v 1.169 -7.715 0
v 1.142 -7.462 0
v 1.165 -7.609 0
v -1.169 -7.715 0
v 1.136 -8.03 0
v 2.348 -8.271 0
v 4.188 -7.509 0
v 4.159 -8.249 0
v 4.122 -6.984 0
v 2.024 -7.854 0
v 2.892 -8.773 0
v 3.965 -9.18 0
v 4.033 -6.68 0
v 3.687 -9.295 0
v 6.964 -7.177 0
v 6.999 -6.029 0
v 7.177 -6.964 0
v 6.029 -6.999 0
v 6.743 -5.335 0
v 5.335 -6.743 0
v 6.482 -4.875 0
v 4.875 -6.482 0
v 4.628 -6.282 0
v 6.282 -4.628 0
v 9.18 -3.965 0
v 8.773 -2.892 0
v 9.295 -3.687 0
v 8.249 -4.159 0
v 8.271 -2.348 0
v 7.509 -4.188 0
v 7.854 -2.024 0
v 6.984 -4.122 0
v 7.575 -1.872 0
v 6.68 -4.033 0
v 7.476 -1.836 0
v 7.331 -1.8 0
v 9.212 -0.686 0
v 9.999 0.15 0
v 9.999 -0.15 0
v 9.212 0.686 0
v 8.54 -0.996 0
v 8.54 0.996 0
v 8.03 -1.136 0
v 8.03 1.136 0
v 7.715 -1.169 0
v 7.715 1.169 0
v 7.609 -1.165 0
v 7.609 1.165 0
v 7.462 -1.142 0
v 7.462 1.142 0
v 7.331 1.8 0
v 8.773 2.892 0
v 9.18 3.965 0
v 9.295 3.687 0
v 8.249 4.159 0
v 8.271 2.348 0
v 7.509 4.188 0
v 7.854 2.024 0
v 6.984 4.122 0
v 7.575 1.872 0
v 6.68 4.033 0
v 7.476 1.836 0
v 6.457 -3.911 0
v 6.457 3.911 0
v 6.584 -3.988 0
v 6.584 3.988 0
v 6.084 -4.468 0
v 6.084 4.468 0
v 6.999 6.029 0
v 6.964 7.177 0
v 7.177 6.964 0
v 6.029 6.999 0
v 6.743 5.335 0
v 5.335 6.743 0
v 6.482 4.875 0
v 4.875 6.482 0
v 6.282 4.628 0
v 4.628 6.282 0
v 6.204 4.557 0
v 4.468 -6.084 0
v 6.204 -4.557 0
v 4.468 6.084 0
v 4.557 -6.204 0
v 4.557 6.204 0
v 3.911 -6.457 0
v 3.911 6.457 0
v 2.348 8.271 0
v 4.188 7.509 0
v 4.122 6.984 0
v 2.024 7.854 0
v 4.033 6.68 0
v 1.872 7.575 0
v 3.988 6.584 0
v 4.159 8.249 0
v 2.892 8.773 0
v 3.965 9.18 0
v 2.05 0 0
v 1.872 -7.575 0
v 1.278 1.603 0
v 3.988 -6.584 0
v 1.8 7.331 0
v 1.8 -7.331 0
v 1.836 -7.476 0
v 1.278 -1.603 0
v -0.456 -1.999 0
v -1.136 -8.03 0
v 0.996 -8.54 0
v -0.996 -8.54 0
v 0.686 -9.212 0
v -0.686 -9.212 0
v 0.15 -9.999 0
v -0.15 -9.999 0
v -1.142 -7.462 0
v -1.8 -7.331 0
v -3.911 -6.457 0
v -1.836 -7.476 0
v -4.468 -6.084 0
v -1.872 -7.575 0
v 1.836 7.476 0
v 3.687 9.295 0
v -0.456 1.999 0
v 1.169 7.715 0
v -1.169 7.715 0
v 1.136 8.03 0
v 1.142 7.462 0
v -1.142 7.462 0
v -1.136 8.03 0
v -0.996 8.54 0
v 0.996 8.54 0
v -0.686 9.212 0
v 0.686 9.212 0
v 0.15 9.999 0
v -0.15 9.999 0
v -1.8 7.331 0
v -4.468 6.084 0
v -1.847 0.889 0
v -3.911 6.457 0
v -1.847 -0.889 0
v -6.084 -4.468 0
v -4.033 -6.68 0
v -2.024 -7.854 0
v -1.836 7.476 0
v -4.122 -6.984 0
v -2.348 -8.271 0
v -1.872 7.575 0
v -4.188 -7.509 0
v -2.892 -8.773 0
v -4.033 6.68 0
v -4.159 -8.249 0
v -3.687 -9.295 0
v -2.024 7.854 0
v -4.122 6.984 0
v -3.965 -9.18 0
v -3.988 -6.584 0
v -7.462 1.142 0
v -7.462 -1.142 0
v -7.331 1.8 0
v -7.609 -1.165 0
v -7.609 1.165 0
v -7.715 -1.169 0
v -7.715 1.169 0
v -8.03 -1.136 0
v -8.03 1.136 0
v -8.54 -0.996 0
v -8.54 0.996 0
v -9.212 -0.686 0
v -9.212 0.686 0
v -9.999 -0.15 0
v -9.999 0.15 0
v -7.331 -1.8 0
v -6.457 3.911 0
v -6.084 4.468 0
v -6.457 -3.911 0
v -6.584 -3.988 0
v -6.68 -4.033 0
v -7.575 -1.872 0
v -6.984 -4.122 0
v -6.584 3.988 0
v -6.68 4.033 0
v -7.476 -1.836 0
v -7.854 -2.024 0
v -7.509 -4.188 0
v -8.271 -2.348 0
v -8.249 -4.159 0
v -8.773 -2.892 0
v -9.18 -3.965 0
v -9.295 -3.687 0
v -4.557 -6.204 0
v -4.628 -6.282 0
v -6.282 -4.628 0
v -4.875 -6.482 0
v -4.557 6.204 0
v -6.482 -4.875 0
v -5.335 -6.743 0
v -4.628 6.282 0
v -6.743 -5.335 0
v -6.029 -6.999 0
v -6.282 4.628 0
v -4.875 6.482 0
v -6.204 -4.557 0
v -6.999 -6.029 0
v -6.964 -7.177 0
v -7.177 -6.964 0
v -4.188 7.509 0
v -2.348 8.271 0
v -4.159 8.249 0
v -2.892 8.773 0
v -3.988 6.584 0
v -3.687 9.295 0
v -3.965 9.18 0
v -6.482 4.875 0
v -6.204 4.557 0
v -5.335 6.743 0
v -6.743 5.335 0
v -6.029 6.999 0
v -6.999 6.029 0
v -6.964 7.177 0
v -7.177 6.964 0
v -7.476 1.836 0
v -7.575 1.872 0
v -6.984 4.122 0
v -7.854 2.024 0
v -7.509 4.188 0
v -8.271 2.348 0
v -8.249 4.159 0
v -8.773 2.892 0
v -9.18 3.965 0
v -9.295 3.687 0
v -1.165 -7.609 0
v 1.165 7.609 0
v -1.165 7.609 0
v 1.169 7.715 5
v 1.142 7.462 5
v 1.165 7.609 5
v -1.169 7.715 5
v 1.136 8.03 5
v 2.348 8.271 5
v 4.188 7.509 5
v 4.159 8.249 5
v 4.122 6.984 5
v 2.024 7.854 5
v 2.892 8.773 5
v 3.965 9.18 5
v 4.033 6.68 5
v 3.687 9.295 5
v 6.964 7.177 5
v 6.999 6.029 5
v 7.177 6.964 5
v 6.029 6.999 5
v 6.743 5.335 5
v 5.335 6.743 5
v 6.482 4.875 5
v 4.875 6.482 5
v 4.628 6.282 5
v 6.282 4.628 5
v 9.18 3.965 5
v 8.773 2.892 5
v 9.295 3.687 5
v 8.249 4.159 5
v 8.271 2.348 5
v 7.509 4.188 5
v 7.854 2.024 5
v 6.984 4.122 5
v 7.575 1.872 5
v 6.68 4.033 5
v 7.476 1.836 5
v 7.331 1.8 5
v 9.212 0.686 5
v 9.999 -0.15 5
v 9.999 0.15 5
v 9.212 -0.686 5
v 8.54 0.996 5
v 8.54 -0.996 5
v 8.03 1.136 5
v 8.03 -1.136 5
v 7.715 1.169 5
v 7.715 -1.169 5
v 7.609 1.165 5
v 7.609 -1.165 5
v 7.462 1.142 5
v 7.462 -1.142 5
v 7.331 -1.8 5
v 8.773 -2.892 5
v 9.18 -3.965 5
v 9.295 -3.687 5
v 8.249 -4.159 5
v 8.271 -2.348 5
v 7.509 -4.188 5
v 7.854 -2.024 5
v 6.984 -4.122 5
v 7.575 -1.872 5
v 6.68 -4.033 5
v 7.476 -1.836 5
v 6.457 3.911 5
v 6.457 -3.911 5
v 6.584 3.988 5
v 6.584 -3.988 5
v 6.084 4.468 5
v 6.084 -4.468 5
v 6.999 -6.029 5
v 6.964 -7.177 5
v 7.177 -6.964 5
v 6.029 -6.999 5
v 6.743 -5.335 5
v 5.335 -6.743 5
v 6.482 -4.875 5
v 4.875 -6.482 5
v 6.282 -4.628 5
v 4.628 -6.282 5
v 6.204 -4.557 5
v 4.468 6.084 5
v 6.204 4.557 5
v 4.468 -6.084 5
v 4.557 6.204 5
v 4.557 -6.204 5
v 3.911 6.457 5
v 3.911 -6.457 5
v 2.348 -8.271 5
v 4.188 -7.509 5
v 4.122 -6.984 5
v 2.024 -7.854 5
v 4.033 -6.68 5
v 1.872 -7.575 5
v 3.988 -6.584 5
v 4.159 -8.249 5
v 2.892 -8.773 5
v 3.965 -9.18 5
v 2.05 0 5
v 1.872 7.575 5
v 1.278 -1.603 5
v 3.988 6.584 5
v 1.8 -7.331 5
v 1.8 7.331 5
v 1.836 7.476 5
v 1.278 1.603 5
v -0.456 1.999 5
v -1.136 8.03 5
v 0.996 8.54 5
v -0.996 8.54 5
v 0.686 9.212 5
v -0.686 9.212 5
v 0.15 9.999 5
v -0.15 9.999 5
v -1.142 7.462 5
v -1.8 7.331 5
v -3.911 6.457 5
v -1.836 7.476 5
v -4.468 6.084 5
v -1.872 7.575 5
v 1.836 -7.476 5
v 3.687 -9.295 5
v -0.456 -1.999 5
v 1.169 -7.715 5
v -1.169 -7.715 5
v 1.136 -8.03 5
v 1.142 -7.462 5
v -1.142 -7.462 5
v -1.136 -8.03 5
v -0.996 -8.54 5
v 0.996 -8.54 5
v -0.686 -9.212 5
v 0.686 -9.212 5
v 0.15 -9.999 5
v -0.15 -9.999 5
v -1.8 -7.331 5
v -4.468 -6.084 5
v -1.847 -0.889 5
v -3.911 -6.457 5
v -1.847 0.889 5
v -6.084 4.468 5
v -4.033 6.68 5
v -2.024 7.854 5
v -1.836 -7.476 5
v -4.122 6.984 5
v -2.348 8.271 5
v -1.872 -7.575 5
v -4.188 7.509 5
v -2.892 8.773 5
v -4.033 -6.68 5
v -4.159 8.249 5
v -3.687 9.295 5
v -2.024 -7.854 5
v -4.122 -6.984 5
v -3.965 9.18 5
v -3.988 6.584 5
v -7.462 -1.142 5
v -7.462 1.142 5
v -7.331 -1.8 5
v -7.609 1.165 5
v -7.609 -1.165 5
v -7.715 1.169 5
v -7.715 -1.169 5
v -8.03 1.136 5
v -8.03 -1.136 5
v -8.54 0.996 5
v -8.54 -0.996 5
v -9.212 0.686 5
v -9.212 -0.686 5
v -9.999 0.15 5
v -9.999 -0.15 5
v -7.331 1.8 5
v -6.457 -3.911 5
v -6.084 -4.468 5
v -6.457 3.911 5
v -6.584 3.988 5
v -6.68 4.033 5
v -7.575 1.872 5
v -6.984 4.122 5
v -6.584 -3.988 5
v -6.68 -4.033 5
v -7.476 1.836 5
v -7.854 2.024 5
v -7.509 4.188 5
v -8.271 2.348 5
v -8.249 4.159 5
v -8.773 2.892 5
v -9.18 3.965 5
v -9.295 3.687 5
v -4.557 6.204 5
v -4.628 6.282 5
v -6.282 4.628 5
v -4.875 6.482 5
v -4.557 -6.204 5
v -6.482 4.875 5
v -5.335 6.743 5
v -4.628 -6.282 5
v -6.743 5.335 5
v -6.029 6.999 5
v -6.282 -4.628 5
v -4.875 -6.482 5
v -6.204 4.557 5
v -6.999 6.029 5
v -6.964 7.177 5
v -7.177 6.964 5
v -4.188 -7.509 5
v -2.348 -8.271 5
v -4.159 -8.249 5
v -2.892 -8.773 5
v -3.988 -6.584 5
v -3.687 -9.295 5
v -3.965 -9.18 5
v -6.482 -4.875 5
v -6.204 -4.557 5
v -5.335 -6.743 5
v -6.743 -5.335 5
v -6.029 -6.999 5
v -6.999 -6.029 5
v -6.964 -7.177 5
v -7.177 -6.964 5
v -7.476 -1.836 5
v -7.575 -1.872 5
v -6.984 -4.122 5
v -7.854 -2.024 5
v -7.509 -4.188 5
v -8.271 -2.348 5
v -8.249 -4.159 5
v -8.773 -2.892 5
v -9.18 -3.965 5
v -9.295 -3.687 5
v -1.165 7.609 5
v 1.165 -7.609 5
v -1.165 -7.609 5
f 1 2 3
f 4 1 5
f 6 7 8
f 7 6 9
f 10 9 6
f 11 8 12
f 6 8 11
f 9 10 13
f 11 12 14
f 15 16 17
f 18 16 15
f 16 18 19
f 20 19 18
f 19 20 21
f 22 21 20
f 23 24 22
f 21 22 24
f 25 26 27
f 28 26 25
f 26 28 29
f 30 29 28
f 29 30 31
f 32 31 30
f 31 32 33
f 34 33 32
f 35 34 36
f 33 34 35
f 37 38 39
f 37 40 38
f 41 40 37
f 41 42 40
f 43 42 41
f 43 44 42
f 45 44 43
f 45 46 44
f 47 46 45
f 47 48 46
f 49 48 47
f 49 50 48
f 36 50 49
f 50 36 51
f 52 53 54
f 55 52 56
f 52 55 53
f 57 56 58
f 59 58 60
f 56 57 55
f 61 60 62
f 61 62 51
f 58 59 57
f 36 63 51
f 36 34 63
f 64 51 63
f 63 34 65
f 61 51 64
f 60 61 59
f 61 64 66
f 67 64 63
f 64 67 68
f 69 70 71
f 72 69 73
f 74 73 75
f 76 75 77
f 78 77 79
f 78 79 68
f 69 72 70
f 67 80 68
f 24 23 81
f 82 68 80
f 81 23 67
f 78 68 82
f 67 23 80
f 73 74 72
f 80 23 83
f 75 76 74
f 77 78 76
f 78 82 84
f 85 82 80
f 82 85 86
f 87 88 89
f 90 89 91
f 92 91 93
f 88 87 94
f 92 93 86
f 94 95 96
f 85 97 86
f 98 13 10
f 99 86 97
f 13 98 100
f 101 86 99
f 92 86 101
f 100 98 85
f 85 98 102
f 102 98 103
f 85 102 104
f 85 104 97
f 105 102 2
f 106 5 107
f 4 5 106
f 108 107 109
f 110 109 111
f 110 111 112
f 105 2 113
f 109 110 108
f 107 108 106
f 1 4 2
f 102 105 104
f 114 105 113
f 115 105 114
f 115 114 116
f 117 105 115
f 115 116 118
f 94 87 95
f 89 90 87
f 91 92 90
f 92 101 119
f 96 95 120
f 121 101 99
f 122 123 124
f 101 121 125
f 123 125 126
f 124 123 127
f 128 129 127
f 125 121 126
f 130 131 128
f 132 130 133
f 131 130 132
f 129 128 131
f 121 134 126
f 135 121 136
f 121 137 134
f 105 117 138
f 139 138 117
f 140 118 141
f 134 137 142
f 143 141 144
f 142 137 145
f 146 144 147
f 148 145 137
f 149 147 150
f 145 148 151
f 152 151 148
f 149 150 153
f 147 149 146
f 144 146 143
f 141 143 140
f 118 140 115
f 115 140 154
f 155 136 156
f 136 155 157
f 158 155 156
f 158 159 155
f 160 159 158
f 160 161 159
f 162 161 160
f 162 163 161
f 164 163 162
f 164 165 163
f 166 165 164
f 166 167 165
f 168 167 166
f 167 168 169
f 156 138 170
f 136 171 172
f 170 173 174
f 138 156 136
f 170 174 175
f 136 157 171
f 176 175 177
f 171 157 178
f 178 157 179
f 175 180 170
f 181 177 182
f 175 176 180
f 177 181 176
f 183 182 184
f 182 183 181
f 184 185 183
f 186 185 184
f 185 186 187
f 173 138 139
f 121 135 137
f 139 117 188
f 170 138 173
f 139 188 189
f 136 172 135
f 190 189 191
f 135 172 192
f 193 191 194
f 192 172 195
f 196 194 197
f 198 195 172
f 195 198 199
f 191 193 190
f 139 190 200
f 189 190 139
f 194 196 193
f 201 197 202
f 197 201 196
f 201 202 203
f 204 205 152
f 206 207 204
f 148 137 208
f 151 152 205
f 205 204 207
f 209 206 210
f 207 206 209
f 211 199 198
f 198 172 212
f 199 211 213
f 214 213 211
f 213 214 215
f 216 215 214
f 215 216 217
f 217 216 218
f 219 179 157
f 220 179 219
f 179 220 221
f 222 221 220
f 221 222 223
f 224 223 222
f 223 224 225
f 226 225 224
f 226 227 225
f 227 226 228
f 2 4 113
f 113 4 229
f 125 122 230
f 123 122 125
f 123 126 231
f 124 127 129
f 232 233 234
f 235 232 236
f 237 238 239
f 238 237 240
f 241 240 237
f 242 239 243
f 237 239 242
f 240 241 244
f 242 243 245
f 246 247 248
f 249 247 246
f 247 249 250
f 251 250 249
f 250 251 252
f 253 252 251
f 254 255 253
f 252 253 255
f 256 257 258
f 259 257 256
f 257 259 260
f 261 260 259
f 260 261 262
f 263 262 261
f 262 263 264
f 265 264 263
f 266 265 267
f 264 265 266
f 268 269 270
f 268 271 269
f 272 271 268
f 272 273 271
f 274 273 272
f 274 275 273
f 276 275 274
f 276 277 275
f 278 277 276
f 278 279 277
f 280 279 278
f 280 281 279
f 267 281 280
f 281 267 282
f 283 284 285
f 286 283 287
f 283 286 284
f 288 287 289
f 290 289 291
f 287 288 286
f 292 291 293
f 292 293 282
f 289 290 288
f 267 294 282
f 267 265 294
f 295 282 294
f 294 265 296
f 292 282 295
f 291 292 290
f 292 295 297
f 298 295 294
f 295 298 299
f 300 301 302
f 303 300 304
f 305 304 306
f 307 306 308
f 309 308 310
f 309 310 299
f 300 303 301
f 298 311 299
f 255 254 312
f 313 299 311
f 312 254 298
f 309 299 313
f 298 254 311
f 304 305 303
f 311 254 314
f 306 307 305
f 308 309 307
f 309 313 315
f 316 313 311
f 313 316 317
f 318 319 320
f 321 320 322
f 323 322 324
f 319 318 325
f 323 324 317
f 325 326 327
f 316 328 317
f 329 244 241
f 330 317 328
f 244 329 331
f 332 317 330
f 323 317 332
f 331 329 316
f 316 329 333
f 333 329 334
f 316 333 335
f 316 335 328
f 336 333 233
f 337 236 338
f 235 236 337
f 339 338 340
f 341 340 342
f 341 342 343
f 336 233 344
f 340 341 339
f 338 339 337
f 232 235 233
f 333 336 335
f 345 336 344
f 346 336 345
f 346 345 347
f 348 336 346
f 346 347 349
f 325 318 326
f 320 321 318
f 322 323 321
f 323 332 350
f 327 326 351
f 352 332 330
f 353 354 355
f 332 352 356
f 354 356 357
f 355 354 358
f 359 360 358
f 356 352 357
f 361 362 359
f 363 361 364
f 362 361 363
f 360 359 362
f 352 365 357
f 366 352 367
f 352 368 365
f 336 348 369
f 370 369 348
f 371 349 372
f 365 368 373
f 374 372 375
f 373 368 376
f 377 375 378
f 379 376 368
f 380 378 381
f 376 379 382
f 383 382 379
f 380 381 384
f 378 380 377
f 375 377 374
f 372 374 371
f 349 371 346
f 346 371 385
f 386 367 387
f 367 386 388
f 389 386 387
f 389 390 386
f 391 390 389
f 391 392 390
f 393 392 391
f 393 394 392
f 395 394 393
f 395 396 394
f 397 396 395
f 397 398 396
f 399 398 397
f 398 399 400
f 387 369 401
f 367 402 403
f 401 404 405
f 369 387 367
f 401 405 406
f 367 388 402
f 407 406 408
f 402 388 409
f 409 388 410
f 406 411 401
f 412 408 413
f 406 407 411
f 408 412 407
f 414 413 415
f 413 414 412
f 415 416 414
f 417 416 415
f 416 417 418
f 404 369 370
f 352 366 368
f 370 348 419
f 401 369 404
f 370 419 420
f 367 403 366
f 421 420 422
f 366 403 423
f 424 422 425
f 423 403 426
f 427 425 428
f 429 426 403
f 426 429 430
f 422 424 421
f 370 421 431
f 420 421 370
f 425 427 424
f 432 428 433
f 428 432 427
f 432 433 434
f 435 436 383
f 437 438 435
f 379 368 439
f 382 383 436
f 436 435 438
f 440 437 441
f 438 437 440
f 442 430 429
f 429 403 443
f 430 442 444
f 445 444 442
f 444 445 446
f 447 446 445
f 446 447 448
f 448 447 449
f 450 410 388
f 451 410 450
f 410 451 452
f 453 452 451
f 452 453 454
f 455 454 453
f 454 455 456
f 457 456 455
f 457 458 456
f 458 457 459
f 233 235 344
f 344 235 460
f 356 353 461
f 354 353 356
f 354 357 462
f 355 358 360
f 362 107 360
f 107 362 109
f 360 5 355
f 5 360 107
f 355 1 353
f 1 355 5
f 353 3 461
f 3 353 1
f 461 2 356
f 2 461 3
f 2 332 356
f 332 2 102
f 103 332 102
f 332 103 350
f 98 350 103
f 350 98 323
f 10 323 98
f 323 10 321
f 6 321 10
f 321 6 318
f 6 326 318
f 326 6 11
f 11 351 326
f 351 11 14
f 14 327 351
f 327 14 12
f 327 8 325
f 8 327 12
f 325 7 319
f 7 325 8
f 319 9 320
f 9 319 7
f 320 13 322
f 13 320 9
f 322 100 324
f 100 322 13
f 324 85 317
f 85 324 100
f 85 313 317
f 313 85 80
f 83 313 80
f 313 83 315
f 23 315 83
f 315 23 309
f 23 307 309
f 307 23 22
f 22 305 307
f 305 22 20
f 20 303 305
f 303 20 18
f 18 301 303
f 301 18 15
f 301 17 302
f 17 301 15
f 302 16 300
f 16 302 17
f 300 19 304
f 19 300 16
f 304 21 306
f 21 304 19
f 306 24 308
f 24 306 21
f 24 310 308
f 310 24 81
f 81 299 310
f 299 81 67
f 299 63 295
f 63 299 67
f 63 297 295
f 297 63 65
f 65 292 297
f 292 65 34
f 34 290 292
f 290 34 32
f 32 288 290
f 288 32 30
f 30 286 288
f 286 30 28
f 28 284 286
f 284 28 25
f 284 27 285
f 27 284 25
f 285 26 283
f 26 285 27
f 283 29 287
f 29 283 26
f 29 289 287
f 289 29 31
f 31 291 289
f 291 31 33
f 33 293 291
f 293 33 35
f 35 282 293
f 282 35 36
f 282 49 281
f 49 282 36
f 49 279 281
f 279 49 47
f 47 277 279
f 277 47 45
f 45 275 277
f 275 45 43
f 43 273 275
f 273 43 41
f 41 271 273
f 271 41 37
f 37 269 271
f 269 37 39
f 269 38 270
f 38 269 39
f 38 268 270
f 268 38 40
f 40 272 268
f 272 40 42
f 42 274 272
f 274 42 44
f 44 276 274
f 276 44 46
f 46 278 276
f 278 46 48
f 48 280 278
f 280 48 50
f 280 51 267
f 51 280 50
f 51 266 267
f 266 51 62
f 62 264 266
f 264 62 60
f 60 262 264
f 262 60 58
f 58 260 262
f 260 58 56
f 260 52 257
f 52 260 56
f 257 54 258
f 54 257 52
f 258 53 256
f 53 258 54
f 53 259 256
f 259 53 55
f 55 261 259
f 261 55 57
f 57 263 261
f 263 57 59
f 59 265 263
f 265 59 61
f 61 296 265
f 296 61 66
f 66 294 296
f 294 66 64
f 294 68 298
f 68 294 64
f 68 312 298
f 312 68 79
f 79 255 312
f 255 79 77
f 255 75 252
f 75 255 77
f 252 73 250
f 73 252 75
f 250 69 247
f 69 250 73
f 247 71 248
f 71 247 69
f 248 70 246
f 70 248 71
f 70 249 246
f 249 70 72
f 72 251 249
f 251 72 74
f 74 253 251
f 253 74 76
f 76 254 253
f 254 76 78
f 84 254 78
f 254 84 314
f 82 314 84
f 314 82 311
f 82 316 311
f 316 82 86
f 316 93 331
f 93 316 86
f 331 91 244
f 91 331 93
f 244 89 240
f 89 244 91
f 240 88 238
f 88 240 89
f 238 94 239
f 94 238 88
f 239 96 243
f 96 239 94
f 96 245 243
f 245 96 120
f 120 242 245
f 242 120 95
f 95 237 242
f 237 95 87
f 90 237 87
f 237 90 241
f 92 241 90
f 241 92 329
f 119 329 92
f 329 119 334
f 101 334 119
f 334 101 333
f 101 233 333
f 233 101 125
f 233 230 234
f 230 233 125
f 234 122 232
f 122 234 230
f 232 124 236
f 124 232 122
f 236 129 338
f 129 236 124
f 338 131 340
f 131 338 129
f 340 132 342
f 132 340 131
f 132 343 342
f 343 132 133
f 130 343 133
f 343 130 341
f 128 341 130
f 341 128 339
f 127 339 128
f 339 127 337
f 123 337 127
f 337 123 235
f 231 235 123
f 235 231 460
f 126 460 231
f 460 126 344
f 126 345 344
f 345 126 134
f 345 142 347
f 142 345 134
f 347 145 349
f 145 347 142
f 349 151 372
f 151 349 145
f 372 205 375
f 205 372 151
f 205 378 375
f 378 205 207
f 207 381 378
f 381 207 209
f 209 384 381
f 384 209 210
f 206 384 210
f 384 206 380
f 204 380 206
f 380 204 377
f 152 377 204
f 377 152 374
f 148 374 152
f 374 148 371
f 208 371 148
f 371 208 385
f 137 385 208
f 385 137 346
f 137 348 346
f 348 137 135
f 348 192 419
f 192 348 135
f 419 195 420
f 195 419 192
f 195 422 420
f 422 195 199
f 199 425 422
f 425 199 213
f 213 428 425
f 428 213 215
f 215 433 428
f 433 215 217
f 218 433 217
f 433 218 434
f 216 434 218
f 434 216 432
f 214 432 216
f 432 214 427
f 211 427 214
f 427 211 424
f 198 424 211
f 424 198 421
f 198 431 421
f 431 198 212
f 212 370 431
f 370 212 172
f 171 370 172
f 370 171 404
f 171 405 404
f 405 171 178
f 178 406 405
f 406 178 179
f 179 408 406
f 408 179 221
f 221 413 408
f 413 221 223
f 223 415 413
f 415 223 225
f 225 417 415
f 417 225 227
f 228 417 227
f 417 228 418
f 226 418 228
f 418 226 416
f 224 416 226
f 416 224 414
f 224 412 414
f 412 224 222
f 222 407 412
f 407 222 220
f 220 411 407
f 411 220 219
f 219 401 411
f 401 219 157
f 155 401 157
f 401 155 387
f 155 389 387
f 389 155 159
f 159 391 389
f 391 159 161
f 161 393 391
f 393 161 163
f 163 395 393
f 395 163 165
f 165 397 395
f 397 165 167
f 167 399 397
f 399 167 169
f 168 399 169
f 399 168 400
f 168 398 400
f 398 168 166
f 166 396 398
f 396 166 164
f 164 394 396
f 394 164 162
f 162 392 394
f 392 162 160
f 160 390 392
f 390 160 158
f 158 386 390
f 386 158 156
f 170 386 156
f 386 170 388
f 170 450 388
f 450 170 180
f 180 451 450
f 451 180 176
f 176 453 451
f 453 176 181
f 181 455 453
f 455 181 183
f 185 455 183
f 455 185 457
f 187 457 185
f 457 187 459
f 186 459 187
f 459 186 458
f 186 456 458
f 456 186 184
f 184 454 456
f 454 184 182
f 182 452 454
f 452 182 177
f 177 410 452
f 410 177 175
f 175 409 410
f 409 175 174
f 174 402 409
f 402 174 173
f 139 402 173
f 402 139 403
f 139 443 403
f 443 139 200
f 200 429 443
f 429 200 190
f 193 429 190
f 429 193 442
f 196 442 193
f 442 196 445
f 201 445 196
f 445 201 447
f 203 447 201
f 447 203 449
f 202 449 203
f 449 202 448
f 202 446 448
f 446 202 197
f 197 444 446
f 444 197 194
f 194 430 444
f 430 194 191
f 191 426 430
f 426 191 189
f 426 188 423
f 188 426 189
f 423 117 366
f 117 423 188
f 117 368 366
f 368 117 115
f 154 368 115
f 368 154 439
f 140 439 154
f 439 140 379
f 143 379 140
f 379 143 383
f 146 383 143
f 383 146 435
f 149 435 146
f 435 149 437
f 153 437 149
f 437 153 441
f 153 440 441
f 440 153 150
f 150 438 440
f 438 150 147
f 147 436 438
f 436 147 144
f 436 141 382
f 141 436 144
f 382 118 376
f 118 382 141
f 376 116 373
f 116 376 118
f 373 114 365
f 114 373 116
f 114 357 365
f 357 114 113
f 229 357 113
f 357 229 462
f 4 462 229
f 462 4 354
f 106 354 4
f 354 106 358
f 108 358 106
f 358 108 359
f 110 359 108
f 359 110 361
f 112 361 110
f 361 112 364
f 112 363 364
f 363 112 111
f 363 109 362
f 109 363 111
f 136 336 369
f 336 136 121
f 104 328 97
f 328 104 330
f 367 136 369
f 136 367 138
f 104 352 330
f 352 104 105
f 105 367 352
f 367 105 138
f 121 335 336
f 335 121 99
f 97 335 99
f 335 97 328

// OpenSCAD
use <../libraries/MCAD/involute_gears.scad>

//test_gears();
Gear();

module SmoothHole() {
    translate([6.5,0,-1]) cylinder(r=1.5, h=10, $fn=6);
}

module WadeL_double_helix(){
	//Large WADE's Gear - Double Helix

	pressure_angle=30;
    hub_diameter = 0;
    rim_width = 0;
	circles=0;
	teeth=30;
	pitch=200;
	twist=250;
	height=40;
    bore_diameter = 4;

	difference(){
		union(){
		// половина шевронной шестерни
		gear (number_of_teeth=teeth,
			circular_pitch=pitch,
			pressure_angle=pressure_angle,
			clearance = 0.2,
			gear_thickness = height/2,
			rim_thickness = height/2,
			rim_width = rim_width,
			hub_thickness = height/2*1.5-2-1.5,
			hub_diameter = hub_diameter,
			bore_diameter = bore_diameter,
			circles=circles,
			twist = twist/teeth);
		// вторая половина шевронной шестерни
		mirror([0,0,50])
		gear (number_of_teeth=teeth,
			circular_pitch=pitch,
			pressure_angle=pressure_angle,
			clearance = 0.2,
			gear_thickness = height/2,
			rim_thickness = height/2,
			rim_width = rim_width,
			hub_thickness = height/2,
			hub_diameter=hub_diameter,
			bore_diameter=bore_diameter,
            circles=circles,
			twist=twist/teeth);
		}
	}
}

module Gear(){
	//Large WADE's Gear - Double Helix

	pressure_angle=30;
    hub_diameter = 0;
    rim_width = 0;
	circles=0;
	teeth=16;
	pitch=200;
	twist=0;
	height=5;
    bore_diameter = 4.1;

    gear (number_of_teeth=teeth,
        circular_pitch=pitch,
        pressure_angle=pressure_angle,
        clearance = 0.2,
        gear_thickness = height,
        rim_thickness = height,
        rim_width = rim_width,
        hub_thickness = height,
        hub_diameter = hub_diameter,
        bore_diameter = bore_diameter,
        circles=circles,
        twist = twist/teeth);
}
